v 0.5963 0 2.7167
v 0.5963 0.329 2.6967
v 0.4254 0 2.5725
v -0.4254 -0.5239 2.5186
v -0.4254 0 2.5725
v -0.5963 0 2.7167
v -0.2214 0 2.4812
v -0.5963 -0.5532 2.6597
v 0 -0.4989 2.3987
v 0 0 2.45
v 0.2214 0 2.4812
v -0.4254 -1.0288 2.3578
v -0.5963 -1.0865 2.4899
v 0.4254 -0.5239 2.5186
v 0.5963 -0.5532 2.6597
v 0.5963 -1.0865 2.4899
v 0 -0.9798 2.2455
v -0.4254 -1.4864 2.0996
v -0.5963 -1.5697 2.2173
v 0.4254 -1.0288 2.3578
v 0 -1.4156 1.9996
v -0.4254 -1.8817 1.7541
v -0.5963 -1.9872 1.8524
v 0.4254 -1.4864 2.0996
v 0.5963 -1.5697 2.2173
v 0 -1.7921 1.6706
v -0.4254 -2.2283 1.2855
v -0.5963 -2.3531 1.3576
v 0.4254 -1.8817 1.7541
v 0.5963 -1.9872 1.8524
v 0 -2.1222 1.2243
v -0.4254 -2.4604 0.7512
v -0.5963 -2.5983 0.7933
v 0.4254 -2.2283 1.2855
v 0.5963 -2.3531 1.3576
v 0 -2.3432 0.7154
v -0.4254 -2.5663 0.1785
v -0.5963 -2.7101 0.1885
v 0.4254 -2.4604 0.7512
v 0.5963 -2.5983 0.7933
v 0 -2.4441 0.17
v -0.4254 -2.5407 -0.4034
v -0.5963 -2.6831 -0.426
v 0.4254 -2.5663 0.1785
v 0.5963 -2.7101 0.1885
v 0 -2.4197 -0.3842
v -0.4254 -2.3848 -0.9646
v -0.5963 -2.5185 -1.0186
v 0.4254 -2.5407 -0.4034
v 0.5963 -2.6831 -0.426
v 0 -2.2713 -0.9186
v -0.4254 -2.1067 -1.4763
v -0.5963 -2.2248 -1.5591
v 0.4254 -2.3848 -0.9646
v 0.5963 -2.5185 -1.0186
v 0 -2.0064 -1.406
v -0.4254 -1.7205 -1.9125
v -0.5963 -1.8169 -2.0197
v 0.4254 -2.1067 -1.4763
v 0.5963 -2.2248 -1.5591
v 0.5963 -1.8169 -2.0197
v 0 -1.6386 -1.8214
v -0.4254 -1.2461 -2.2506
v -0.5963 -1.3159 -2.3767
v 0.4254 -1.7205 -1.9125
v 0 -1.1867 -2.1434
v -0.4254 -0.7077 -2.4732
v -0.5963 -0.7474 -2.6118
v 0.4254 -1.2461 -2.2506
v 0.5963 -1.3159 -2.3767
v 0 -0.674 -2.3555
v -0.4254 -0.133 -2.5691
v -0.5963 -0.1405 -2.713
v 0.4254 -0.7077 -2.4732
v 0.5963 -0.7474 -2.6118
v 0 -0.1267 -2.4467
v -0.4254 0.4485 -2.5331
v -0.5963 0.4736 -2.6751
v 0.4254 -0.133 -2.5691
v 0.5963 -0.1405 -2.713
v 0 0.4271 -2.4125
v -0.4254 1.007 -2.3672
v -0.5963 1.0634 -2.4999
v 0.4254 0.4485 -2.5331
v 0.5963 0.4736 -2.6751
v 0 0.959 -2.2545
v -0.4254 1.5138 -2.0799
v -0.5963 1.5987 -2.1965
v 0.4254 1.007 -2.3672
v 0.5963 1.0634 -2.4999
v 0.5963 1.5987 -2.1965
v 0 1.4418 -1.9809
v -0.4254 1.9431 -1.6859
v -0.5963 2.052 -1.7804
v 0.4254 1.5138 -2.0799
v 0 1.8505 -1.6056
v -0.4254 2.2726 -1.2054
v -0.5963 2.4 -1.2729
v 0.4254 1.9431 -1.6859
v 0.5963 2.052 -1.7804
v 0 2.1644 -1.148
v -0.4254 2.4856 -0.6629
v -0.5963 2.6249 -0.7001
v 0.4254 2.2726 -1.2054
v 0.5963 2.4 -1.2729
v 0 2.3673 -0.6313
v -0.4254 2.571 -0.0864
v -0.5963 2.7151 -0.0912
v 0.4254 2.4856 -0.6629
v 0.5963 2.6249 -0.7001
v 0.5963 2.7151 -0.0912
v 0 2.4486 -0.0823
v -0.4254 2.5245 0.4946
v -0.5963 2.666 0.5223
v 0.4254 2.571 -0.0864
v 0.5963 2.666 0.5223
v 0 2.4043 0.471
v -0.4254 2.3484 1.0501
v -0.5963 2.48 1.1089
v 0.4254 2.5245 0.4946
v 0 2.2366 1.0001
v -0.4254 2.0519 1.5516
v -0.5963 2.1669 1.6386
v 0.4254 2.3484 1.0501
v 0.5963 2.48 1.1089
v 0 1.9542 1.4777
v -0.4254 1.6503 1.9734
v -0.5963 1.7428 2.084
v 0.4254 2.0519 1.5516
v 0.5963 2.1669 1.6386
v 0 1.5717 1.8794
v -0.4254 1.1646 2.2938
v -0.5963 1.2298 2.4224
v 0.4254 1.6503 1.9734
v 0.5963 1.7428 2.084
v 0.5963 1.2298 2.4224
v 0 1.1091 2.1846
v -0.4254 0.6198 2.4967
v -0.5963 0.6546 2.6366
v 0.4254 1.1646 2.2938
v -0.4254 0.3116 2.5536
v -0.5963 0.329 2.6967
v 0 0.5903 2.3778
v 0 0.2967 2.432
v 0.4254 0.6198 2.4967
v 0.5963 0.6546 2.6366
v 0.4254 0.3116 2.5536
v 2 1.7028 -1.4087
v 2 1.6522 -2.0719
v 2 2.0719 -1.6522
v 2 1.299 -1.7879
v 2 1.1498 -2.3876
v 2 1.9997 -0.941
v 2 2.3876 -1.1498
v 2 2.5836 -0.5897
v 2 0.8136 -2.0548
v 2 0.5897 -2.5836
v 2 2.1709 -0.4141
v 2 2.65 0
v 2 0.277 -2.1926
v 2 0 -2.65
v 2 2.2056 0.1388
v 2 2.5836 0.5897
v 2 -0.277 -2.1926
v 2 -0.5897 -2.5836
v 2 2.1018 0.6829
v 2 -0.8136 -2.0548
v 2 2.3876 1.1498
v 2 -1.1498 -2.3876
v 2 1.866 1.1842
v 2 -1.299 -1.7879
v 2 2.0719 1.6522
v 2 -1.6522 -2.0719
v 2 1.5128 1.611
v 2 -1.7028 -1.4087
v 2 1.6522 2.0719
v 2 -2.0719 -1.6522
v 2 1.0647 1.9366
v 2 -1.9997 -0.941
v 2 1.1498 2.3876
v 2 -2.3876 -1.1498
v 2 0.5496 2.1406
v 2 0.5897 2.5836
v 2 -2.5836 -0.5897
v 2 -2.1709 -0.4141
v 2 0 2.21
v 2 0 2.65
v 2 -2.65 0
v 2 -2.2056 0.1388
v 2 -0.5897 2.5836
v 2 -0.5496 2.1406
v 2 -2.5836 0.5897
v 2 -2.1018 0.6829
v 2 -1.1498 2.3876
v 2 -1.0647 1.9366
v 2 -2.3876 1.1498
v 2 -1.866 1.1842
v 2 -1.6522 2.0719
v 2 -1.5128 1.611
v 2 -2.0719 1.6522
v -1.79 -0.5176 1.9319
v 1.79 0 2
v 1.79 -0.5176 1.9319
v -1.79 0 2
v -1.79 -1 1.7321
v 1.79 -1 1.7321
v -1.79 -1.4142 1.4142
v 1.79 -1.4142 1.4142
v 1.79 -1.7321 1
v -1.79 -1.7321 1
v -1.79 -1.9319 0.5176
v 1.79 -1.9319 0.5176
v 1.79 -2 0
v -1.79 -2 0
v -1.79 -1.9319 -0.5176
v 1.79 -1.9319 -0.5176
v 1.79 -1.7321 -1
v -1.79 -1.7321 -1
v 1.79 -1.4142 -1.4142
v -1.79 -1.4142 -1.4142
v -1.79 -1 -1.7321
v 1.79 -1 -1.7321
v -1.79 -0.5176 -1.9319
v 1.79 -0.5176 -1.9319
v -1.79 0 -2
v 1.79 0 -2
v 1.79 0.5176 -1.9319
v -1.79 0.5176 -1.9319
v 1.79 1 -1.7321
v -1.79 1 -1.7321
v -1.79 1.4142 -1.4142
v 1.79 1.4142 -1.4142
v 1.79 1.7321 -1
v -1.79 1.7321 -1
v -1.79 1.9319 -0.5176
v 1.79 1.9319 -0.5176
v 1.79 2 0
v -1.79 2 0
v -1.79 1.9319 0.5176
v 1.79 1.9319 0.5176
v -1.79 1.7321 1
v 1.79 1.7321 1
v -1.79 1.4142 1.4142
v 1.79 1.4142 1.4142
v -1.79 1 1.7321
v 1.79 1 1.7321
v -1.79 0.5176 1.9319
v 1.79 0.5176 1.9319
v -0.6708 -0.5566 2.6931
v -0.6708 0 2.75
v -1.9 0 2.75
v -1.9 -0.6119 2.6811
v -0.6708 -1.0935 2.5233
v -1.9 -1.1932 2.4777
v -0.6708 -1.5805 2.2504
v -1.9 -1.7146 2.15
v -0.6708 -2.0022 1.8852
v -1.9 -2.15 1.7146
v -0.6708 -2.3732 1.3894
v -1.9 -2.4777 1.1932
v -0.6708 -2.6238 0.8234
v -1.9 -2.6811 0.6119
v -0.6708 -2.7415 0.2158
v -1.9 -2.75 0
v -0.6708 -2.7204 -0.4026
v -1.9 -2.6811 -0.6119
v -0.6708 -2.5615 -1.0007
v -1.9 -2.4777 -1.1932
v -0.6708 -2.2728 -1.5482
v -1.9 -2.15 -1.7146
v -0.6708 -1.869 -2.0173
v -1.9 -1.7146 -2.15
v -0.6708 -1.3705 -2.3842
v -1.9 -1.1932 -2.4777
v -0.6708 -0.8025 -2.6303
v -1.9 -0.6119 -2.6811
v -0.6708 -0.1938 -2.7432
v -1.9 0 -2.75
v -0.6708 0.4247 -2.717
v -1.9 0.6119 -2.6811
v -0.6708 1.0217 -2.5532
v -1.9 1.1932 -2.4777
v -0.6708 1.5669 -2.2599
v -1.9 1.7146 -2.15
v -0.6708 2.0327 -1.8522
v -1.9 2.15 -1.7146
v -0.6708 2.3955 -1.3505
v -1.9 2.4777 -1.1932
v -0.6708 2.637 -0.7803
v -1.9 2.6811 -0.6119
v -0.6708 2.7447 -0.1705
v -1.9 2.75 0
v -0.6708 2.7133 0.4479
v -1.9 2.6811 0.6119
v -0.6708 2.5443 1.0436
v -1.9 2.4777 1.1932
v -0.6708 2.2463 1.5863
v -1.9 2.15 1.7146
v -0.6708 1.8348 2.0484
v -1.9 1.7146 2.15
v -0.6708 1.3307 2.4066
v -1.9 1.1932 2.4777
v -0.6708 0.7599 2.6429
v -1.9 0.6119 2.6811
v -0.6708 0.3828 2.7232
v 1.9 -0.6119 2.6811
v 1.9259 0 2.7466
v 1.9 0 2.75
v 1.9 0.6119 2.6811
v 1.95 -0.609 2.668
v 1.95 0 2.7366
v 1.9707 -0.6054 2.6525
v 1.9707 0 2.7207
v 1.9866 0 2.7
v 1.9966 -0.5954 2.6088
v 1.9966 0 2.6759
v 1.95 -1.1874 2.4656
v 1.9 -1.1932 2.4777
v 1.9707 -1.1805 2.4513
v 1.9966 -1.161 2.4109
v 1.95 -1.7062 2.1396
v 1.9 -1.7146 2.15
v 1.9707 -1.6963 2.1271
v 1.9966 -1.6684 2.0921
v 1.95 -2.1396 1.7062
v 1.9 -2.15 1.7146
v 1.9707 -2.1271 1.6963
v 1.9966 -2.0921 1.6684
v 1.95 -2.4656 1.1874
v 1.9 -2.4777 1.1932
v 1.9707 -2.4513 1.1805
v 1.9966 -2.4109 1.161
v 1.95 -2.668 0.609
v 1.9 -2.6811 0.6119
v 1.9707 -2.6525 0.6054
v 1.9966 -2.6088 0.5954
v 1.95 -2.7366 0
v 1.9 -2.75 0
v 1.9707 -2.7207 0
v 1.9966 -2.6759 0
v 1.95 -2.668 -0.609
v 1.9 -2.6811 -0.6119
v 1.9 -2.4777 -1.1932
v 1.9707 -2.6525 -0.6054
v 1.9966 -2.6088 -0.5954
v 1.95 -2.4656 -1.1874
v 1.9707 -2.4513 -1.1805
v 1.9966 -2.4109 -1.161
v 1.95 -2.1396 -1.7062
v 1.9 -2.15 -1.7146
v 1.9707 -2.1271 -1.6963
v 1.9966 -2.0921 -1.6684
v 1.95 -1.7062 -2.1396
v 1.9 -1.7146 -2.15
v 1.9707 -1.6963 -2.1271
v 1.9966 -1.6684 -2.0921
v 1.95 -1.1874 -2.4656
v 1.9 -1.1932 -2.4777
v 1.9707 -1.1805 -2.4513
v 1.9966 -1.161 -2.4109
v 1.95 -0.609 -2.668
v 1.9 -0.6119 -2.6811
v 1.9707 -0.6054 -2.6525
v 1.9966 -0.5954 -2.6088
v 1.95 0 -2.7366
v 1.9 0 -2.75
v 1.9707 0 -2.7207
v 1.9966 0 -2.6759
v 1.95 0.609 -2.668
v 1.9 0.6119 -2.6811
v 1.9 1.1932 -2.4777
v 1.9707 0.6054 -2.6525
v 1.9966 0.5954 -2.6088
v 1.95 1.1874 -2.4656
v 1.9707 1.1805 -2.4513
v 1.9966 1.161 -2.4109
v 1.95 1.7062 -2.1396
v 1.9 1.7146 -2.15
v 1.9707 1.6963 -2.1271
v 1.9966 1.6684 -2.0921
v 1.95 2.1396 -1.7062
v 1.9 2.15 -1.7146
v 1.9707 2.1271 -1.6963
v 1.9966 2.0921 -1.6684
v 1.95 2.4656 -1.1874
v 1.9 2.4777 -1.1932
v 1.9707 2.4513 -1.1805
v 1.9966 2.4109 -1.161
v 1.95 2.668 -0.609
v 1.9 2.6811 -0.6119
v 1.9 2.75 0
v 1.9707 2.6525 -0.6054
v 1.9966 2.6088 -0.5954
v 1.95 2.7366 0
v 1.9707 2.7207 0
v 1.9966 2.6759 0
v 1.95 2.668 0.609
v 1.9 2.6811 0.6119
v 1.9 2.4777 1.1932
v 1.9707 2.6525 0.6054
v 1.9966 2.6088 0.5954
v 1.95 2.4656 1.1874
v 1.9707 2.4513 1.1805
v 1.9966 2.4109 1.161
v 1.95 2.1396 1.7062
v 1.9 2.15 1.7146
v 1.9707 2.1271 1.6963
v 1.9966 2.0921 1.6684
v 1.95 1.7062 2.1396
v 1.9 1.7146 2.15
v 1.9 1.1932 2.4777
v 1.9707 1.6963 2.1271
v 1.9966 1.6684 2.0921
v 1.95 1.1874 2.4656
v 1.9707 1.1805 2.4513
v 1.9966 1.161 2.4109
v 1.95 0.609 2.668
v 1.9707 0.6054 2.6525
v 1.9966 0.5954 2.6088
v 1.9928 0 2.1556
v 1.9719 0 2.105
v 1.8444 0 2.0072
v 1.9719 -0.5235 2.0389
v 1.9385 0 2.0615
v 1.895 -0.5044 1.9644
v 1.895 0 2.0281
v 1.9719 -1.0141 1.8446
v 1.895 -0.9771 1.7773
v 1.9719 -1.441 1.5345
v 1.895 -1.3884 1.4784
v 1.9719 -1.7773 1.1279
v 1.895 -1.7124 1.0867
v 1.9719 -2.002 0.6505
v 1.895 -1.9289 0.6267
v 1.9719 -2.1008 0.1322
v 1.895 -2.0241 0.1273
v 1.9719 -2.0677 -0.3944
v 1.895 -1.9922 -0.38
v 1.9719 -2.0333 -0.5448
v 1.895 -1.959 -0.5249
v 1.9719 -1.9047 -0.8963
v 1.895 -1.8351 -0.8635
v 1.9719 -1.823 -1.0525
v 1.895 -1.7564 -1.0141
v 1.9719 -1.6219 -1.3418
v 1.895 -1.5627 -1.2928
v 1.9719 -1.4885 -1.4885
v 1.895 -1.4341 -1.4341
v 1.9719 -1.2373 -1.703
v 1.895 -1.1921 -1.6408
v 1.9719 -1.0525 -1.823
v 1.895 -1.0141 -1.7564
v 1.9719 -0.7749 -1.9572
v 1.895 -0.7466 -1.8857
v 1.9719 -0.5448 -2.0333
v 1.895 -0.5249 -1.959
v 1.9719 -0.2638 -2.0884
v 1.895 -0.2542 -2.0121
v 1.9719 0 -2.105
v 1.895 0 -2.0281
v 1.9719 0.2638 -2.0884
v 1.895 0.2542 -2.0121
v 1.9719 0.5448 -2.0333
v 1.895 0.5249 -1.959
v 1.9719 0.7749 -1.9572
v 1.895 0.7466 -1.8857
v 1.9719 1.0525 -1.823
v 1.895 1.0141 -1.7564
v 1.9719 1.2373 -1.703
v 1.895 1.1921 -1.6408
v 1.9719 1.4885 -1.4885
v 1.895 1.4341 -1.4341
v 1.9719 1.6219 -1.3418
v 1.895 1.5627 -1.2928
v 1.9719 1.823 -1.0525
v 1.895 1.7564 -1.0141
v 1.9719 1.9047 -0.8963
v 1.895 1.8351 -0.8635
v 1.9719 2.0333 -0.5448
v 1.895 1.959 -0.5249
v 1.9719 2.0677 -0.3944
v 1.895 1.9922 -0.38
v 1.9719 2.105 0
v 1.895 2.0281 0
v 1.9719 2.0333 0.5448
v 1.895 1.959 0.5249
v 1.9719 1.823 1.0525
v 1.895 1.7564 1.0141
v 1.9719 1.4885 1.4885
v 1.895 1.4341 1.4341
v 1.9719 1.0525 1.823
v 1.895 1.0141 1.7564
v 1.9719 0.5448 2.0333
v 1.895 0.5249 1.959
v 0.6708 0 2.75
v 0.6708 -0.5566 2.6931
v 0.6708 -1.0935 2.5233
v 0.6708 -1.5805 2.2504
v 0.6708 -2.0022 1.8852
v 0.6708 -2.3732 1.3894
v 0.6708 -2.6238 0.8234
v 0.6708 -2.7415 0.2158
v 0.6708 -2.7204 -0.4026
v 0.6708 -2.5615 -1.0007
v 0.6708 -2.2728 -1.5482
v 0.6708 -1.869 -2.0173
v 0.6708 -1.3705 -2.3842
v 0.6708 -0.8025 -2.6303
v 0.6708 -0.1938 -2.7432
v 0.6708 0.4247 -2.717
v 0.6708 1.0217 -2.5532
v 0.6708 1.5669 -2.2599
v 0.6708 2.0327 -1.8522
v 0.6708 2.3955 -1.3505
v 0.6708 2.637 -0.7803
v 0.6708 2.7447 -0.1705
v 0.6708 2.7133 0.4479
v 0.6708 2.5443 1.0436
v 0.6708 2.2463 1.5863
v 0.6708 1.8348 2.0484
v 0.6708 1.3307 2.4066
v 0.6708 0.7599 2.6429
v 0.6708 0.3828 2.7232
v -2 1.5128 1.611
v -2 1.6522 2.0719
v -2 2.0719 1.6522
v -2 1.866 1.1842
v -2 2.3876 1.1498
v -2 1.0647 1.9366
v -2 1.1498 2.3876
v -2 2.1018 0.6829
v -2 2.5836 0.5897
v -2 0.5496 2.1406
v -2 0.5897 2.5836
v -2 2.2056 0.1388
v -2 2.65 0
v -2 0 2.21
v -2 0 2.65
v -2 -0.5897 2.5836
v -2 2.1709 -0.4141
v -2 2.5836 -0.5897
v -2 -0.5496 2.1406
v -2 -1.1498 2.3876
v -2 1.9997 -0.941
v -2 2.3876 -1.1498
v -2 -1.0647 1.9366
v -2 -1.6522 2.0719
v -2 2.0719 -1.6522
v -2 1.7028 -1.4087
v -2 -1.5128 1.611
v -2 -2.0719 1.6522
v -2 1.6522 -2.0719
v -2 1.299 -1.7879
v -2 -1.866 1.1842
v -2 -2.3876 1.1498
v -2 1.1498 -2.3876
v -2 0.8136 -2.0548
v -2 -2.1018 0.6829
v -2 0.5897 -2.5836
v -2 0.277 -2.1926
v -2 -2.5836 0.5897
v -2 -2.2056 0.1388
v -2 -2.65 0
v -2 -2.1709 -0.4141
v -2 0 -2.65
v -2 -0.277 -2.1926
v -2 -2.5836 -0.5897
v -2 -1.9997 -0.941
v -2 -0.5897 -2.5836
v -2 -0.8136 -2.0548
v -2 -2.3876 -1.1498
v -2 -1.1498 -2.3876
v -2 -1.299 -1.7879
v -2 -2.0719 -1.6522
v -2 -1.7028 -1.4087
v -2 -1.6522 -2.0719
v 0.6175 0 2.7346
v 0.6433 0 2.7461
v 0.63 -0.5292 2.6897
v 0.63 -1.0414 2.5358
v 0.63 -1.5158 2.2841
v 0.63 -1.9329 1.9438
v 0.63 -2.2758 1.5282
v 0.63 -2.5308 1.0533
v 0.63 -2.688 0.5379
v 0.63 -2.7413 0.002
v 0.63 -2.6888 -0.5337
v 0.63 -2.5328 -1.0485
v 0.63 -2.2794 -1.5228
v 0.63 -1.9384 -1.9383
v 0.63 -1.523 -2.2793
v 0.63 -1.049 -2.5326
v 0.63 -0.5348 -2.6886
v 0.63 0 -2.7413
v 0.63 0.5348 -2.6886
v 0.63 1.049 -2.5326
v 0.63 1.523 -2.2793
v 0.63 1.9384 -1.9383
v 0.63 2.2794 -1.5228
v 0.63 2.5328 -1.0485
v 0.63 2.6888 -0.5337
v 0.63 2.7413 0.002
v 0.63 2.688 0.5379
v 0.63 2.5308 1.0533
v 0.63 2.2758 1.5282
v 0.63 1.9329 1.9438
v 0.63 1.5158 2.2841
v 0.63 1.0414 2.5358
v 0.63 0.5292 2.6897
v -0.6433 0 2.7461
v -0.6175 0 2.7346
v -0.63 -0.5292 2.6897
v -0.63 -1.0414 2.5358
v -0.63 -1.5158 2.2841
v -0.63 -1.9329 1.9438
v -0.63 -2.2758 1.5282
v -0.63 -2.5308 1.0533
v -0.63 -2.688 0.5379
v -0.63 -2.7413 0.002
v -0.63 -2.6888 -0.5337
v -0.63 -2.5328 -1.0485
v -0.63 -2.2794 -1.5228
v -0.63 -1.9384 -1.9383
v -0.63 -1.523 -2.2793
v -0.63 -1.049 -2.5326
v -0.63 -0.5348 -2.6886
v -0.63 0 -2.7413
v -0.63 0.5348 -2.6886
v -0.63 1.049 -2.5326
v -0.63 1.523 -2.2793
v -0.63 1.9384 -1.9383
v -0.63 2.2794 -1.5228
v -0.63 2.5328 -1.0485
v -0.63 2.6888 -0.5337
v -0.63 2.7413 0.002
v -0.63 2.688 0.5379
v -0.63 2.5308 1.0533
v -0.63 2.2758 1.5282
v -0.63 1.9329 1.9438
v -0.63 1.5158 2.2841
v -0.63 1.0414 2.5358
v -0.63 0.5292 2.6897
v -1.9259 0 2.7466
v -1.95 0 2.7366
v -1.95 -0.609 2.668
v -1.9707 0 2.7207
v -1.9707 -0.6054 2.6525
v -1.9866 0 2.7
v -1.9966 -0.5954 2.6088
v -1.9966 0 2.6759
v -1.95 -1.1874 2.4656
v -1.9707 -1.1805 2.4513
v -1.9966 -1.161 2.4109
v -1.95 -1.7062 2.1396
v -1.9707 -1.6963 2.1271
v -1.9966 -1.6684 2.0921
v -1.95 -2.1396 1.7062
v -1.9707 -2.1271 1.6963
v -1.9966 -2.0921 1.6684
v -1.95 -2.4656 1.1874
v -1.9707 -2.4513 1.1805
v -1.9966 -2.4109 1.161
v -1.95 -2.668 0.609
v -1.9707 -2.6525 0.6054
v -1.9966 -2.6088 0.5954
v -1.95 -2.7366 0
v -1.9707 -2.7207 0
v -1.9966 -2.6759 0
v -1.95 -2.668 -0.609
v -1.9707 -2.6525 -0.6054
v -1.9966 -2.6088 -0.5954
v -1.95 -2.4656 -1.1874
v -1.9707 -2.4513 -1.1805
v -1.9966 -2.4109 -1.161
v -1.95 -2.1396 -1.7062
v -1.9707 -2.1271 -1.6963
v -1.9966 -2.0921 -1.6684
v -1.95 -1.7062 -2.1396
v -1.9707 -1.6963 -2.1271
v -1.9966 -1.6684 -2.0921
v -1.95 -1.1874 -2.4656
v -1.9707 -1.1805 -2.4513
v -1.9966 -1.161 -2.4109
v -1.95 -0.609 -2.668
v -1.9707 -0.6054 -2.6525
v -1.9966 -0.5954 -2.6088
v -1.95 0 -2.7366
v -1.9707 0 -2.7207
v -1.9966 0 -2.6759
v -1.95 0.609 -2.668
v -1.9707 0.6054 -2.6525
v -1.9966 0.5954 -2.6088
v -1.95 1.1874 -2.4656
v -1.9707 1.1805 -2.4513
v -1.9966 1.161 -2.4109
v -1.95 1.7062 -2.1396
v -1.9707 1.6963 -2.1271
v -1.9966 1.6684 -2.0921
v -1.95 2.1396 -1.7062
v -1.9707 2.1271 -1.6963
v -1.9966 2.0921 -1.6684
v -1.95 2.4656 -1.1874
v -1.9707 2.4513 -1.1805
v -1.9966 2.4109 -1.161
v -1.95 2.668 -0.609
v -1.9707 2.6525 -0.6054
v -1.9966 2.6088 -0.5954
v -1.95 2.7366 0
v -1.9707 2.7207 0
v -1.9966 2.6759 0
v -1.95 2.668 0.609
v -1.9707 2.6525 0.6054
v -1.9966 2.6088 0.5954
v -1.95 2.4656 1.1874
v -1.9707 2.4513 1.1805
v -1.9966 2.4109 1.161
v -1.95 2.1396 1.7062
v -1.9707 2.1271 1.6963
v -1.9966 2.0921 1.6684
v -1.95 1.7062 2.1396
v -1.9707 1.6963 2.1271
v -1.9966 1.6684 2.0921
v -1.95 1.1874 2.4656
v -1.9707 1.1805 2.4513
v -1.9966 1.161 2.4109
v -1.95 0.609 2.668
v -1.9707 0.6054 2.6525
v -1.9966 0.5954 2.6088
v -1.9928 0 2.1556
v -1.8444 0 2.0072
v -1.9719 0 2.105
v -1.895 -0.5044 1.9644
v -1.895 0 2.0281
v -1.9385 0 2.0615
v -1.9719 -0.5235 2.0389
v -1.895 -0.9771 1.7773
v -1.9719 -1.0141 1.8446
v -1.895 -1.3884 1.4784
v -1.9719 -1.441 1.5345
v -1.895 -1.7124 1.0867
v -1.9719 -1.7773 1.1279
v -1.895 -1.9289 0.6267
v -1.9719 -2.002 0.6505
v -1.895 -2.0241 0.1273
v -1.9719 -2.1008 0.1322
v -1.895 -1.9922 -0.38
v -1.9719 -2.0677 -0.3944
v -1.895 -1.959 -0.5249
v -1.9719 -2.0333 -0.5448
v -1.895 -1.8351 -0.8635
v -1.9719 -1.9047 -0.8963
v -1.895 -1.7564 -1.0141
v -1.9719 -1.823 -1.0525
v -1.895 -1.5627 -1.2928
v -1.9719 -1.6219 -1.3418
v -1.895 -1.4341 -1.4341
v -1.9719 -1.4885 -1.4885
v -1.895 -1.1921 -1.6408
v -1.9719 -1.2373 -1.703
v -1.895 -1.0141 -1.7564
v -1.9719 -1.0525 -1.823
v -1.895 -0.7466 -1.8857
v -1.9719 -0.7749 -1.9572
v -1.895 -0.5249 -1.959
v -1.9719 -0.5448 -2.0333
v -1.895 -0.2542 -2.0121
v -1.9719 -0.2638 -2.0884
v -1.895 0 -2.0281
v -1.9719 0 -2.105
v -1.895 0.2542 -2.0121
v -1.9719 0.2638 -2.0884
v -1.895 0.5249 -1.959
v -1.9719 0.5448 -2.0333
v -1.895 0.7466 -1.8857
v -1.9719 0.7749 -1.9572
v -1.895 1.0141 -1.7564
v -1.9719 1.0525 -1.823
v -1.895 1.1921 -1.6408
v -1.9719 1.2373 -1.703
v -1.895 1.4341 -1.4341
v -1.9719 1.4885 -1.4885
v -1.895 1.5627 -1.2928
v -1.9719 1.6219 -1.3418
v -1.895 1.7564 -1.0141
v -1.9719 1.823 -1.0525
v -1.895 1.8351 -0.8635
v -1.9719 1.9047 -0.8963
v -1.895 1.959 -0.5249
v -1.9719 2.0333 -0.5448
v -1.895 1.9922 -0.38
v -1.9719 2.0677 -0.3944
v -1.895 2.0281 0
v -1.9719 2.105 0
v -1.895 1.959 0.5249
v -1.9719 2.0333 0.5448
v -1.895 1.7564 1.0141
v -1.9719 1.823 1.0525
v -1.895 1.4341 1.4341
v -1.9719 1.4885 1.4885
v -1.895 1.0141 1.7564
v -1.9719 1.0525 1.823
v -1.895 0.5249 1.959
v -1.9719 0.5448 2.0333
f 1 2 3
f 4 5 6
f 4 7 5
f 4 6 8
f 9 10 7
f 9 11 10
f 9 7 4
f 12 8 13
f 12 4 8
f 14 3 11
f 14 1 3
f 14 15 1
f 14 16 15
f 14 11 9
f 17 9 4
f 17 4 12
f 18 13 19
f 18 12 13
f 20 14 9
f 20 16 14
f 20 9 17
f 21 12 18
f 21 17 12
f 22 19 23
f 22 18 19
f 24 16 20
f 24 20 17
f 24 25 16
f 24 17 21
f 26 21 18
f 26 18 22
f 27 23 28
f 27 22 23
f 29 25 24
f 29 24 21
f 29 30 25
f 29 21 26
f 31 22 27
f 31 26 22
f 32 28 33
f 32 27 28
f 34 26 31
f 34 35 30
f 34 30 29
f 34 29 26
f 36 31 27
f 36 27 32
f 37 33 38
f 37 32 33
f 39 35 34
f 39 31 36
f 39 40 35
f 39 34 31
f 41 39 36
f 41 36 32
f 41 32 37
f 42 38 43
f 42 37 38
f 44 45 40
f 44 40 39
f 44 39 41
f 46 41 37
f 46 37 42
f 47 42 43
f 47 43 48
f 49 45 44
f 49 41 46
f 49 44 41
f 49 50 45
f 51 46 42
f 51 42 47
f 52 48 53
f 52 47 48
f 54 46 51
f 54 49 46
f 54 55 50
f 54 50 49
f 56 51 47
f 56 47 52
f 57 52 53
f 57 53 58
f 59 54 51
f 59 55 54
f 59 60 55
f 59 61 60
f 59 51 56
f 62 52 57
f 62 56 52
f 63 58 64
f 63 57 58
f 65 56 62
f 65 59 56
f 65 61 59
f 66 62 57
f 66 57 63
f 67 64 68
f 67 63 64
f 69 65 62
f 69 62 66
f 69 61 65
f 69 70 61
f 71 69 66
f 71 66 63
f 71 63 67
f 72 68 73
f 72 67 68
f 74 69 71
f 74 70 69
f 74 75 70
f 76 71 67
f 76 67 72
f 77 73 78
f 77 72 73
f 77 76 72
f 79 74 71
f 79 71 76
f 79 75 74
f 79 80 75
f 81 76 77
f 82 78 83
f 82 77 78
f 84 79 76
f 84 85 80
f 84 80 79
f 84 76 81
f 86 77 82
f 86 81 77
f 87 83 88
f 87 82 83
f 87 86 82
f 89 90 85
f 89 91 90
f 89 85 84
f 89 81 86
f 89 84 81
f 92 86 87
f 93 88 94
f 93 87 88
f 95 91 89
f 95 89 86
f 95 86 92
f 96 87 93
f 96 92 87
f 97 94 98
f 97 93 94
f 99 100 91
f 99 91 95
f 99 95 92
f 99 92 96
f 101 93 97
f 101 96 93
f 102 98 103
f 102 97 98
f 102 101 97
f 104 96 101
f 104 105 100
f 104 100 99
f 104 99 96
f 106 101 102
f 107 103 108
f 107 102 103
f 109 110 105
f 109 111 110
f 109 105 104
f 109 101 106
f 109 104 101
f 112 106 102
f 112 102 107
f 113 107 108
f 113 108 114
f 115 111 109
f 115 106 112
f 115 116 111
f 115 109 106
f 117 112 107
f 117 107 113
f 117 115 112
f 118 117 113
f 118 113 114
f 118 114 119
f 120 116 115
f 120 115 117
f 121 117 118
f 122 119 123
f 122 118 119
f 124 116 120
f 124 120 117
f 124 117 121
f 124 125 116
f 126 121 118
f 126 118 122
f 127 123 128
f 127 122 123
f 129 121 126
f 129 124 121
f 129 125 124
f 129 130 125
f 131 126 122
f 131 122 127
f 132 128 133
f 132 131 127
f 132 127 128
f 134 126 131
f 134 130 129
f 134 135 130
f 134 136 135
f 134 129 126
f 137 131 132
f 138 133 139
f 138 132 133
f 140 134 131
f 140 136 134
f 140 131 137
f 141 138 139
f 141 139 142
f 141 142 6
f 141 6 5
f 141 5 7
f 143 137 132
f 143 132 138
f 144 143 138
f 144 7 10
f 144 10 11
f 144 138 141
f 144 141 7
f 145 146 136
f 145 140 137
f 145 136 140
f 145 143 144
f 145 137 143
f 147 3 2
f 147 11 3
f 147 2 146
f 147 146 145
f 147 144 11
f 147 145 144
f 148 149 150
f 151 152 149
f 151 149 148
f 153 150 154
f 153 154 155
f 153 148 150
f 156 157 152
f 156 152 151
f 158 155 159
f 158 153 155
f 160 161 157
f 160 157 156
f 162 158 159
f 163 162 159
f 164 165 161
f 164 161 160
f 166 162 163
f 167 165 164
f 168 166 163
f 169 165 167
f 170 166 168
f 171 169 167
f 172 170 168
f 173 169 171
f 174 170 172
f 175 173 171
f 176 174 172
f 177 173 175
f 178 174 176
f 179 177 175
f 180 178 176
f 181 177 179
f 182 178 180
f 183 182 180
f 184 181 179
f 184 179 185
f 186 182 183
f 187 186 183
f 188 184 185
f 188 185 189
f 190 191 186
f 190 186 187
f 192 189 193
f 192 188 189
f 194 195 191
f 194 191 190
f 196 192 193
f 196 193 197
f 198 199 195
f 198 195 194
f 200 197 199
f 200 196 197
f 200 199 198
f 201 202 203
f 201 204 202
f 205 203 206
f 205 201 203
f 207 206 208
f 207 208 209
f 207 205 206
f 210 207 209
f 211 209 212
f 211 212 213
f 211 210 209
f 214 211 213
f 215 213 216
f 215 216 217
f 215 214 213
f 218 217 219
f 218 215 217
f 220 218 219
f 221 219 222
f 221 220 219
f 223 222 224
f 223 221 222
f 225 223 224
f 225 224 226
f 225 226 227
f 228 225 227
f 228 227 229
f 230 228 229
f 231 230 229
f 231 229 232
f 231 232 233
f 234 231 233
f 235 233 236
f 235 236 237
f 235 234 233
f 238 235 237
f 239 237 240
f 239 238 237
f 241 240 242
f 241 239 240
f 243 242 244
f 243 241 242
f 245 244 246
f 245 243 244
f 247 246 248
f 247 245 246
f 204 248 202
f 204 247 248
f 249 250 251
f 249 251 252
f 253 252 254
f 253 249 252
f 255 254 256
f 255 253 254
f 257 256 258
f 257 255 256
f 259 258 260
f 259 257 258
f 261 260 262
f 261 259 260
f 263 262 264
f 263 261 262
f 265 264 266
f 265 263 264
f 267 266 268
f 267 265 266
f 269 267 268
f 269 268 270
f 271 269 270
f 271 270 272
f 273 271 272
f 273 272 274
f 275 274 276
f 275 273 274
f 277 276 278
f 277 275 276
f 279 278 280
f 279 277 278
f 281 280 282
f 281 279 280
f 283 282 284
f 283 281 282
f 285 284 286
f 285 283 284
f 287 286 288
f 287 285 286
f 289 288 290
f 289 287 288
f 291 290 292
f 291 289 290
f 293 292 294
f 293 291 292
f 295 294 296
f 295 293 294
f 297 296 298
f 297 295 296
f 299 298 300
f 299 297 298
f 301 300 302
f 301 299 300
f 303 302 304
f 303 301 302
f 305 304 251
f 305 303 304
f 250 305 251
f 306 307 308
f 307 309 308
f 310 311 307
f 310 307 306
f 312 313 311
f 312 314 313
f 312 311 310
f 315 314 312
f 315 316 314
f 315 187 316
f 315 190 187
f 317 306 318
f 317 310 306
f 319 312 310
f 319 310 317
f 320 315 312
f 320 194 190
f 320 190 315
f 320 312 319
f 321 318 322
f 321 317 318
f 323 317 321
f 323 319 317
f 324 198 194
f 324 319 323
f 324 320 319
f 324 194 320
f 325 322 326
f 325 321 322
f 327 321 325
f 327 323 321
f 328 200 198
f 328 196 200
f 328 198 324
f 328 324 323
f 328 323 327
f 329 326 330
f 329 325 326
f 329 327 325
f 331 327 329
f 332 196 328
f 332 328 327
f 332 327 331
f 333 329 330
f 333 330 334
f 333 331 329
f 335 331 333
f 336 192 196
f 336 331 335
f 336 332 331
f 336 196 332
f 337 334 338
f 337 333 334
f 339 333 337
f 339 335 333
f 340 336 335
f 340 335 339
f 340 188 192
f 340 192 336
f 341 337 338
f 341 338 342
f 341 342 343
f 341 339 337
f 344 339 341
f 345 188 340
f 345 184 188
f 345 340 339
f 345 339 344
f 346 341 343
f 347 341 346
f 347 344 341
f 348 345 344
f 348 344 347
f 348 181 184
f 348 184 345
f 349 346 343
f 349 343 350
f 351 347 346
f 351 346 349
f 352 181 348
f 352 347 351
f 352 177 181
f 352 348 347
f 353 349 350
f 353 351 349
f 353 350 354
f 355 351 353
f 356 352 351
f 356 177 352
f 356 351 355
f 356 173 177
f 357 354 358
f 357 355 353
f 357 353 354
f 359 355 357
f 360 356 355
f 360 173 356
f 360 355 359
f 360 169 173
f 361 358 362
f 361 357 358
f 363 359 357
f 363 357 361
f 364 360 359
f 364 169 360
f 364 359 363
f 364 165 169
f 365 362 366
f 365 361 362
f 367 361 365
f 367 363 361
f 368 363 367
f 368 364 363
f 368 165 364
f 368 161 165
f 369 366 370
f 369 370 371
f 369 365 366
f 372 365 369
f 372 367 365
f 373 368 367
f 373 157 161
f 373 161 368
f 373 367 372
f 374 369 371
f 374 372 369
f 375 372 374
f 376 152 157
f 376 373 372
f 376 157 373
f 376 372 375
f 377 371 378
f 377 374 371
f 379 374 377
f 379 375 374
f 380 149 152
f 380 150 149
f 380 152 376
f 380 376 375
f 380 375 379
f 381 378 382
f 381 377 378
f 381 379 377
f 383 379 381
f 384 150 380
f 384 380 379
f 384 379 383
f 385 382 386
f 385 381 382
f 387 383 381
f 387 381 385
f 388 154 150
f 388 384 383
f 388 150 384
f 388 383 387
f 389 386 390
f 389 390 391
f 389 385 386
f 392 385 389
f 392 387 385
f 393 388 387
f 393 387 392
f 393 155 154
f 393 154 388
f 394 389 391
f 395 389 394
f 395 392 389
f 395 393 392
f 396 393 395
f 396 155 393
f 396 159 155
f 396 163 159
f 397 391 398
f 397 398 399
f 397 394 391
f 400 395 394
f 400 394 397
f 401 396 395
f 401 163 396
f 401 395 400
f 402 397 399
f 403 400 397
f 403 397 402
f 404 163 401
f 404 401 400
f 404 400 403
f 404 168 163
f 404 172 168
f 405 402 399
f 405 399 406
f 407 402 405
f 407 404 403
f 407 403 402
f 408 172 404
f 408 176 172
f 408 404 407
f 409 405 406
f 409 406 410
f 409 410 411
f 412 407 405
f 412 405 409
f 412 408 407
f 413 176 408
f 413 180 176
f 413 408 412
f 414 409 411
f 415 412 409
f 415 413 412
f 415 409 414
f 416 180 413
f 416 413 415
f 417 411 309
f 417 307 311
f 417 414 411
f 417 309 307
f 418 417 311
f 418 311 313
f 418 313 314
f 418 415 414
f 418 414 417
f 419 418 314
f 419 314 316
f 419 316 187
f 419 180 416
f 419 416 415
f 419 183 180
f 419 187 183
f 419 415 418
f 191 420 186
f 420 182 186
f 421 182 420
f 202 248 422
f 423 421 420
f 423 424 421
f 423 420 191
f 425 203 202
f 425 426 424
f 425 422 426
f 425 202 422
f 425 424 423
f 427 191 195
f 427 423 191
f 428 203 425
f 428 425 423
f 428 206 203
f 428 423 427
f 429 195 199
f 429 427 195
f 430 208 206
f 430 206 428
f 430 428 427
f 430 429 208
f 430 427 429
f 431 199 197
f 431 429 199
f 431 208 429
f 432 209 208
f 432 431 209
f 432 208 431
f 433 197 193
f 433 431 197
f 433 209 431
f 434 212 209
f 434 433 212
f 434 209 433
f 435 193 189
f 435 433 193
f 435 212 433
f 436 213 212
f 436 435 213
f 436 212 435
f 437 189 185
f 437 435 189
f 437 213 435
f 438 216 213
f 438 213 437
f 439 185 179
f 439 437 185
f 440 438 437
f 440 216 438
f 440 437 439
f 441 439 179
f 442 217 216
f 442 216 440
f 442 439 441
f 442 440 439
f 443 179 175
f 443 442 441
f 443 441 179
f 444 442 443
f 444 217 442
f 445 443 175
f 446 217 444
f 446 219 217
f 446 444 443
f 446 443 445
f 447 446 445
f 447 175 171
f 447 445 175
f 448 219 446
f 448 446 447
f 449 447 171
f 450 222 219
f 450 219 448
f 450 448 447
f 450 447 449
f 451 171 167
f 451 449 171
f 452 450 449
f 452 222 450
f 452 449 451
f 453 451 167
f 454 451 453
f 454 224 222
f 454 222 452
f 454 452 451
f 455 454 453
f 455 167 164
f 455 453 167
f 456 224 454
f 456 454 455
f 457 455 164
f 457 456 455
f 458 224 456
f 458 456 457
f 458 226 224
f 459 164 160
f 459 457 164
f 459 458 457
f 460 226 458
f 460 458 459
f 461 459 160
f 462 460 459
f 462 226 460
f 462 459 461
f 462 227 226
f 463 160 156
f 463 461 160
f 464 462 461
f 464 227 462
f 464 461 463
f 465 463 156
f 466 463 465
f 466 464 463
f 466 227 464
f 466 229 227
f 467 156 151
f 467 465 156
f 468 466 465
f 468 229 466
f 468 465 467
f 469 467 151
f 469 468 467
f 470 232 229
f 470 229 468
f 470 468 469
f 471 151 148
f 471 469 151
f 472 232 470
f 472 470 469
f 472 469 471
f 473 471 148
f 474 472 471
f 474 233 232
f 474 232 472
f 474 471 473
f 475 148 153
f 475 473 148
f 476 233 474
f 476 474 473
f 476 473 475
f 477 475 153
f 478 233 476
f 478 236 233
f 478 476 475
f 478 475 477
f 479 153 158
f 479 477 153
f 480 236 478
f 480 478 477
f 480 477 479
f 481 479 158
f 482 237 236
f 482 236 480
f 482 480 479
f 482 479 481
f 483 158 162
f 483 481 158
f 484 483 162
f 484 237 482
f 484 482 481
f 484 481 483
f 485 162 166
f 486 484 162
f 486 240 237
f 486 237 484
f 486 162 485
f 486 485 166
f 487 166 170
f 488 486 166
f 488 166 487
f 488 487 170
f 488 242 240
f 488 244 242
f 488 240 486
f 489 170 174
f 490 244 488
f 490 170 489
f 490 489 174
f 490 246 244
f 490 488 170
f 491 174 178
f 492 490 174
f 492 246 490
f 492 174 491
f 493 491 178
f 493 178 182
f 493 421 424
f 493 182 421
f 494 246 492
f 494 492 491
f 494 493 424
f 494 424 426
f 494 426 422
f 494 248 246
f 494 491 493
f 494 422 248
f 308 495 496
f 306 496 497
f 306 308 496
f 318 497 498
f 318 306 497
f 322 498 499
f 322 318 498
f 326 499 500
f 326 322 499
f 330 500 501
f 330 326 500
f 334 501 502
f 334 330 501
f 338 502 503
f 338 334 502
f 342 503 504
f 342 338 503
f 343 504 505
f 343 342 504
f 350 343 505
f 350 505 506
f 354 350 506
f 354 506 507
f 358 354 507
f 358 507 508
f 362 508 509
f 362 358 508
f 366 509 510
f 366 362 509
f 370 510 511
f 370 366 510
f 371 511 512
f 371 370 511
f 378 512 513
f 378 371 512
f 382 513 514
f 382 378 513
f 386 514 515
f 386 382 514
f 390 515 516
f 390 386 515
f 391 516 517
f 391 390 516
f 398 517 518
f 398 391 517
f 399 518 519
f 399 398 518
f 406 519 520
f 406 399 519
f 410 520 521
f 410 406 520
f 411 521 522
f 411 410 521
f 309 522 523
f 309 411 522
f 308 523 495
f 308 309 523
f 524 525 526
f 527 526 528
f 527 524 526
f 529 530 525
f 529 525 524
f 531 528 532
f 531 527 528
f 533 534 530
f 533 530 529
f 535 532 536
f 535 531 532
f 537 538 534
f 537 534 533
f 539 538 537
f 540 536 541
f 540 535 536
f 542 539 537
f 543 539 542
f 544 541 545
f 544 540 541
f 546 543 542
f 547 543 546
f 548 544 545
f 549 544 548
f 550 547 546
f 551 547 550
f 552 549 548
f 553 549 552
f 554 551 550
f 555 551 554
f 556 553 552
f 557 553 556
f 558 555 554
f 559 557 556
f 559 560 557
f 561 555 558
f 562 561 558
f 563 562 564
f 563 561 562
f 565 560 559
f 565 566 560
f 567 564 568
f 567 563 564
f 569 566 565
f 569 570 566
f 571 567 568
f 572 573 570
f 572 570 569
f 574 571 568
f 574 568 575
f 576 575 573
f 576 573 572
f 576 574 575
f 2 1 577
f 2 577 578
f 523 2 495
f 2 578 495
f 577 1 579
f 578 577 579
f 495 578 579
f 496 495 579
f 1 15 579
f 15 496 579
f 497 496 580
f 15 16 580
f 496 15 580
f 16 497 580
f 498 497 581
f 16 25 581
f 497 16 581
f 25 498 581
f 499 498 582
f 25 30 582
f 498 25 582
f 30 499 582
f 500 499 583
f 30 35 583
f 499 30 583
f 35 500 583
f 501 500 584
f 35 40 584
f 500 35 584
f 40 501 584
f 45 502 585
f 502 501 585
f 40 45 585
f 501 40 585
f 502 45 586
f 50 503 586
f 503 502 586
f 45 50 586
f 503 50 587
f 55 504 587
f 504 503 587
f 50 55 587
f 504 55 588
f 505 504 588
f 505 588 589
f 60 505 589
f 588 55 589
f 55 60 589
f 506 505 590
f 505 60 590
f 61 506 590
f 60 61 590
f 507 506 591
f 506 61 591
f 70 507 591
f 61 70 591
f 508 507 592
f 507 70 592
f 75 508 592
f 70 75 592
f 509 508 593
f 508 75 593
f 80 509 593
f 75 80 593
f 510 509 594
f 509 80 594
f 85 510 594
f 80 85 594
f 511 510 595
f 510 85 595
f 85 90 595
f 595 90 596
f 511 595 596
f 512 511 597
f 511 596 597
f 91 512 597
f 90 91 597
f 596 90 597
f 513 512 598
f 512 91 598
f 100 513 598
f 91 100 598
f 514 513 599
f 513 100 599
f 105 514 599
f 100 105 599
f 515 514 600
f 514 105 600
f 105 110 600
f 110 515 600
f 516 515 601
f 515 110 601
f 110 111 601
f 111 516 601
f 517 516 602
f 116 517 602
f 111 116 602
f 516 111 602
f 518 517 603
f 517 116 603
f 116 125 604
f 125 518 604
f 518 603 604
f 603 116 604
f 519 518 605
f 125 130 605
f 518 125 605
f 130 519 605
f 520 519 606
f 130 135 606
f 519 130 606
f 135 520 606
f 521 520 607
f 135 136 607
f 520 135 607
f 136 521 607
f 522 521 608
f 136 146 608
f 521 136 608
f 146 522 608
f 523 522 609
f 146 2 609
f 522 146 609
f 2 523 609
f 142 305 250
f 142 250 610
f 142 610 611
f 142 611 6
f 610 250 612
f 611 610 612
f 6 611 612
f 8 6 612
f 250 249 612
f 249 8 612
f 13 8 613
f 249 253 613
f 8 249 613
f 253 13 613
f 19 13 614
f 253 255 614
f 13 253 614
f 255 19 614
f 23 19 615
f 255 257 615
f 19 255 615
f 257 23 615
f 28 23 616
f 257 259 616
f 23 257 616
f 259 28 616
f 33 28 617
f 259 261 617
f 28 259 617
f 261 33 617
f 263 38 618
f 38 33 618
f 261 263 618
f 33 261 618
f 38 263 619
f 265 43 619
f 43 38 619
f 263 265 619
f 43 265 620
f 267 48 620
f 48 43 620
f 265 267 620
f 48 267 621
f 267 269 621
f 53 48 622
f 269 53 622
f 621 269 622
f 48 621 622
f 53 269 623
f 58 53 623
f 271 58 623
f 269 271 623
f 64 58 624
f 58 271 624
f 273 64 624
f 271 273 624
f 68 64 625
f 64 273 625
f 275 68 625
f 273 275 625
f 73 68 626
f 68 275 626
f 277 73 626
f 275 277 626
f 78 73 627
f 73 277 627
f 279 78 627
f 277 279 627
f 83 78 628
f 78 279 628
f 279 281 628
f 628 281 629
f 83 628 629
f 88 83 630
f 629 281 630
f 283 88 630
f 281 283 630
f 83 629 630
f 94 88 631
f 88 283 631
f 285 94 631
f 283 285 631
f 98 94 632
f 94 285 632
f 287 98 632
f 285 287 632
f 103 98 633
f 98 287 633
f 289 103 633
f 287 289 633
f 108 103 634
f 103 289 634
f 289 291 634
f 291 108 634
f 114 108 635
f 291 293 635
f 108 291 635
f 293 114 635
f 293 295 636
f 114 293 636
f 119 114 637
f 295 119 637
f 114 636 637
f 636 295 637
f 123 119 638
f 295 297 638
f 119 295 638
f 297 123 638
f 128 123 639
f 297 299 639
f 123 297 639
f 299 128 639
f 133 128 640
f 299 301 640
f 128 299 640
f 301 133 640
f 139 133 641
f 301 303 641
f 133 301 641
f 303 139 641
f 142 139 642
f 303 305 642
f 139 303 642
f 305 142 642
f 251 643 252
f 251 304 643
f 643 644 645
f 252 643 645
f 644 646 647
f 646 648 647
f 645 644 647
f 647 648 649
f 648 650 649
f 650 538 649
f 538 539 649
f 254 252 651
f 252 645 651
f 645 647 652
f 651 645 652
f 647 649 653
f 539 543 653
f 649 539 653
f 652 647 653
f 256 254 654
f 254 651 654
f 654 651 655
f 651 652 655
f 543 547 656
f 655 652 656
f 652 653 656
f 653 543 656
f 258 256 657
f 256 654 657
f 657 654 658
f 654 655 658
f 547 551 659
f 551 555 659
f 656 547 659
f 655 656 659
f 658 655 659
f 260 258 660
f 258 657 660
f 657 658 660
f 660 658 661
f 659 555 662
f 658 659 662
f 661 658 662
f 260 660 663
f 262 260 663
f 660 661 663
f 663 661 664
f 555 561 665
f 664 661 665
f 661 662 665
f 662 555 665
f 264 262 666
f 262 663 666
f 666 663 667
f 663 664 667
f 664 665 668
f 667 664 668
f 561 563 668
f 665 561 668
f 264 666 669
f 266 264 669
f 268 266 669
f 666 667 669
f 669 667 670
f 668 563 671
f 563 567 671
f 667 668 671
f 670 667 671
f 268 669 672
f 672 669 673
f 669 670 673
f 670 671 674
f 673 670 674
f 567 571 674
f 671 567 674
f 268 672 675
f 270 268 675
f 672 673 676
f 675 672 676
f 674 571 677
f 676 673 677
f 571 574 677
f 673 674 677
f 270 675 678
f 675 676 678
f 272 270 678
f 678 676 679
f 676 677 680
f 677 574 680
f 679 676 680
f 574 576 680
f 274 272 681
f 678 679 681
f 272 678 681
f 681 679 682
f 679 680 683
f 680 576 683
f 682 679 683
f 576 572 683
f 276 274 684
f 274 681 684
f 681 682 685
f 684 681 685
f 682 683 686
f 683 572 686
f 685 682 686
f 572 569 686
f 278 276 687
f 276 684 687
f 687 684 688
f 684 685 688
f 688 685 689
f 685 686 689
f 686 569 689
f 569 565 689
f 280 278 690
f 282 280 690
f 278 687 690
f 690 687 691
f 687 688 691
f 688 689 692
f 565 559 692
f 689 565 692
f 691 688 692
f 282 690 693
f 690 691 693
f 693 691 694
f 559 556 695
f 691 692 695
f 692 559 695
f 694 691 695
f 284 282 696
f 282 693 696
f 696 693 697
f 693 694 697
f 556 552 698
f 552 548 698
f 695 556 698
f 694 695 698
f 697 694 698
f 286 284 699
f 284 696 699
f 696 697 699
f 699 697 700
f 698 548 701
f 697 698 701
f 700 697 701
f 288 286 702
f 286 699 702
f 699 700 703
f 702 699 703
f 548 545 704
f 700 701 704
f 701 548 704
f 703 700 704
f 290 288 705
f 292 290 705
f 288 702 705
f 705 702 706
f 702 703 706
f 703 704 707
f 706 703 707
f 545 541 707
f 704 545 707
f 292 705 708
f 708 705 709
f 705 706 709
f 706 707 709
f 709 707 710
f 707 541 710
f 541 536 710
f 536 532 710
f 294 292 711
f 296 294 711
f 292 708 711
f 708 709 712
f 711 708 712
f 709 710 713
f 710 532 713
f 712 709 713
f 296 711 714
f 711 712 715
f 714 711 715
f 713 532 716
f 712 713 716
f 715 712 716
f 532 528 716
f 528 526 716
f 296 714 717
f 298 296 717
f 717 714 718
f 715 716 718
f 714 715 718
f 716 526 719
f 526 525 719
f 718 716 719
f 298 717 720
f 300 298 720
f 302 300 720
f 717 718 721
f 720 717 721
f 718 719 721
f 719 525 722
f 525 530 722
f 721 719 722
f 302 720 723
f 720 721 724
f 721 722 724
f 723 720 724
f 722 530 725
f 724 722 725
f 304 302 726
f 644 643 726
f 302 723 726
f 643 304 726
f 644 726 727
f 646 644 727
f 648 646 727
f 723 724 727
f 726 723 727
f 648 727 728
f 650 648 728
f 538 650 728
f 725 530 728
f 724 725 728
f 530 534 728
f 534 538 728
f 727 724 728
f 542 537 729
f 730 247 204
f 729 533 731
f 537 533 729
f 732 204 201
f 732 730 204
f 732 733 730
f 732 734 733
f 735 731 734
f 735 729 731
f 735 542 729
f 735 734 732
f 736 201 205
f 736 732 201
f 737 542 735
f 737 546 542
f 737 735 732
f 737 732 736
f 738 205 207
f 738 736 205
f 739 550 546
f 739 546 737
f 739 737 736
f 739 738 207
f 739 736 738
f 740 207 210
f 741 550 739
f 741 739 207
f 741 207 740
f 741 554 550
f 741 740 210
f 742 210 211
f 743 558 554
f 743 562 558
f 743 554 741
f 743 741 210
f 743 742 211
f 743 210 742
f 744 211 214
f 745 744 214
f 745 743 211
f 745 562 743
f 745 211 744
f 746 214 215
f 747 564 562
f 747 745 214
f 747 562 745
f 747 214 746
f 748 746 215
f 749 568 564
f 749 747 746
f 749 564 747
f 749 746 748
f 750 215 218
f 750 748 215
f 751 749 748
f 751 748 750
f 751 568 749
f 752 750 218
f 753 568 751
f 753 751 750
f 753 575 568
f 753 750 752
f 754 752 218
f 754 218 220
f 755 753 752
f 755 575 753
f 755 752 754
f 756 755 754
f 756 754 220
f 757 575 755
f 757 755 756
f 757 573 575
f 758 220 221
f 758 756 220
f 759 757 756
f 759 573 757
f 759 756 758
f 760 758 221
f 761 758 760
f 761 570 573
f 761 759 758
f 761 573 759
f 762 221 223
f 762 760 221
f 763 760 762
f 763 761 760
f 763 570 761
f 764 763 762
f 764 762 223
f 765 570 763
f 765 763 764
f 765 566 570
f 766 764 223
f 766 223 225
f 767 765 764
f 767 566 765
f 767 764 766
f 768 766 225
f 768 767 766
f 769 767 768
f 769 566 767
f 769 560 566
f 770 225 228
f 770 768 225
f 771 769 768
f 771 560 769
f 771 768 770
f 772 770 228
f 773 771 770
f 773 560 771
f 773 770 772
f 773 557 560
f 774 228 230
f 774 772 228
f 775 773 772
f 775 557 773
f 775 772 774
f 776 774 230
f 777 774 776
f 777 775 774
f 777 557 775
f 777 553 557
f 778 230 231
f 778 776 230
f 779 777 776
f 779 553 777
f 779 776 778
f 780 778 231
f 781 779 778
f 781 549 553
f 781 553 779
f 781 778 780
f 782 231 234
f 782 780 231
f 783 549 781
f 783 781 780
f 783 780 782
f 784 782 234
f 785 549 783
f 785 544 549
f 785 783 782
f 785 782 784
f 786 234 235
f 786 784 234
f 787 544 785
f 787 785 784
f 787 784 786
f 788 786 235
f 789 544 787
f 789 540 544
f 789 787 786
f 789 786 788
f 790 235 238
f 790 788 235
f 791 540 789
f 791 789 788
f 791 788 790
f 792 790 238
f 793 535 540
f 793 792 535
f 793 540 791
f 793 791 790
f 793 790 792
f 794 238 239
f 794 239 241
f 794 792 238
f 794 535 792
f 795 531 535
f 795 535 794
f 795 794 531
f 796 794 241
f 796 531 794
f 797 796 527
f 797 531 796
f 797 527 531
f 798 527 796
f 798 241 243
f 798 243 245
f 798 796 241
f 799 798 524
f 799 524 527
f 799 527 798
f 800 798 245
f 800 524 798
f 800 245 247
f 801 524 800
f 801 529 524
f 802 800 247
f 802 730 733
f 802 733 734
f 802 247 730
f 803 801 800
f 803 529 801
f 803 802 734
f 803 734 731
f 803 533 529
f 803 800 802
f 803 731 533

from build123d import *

# Parameters (mm, degrees)
FILLET1_R    = 1
SCALE2_SCALE = 0.1


with BuildPart() as part:
    # Sketch1 → Revolve1 (revolve)
    with BuildSketch(Plane.XY, mode=Mode.PRIVATE) as revolve1_sk:
        with BuildLine():
            Line((-20, 27.5), (-6.244997998, 27.5))
            ThreePointArc((-6.244997998, 27.5), (0, 24.5), (6.244997998, 27.5))
            Line((6.244997998, 27.5), (20, 27.5))
            Line((20, 27.5), (20, 22.1))
            ThreePointArc((20, 22.1), (19.38492424, 20.61507576), (17.9, 20))
            Line((17.9, 20), (-17.9, 20))
            ThreePointArc((-17.9, 20), (-19.38492424, 20.61507576), (-20, 22.1))
            Line((-20, 22.1), (-20, 27.5))
        make_face()
    revolve(revolve1_sk.sketch.rotate(Axis((-65.552679482, 0, 0), (1, 0, 0)), 90), axis=Axis((-65.552679482, 0, 0), (1, 0, 0)))

    # Fillet1
    fillet1_edges = [part.edges().sort_by_distance(p)[0] for p in [
        (-20, 0, -27.5),
        (-6.244997998, 0, -27.5),
        (6.244997998, 0, -27.5),
        (20, 0, -27.5),
    ]]
    fillet(fillet1_edges, radius=FILLET1_R)


with BuildPart() as part_1:
    # Scale2: scaled about (0, 0, -5.2e-08)
    add(part.part.scale(SCALE2_SCALE).moved(Location((0, 0, -4.7e-08))))


solid = part_1.part
